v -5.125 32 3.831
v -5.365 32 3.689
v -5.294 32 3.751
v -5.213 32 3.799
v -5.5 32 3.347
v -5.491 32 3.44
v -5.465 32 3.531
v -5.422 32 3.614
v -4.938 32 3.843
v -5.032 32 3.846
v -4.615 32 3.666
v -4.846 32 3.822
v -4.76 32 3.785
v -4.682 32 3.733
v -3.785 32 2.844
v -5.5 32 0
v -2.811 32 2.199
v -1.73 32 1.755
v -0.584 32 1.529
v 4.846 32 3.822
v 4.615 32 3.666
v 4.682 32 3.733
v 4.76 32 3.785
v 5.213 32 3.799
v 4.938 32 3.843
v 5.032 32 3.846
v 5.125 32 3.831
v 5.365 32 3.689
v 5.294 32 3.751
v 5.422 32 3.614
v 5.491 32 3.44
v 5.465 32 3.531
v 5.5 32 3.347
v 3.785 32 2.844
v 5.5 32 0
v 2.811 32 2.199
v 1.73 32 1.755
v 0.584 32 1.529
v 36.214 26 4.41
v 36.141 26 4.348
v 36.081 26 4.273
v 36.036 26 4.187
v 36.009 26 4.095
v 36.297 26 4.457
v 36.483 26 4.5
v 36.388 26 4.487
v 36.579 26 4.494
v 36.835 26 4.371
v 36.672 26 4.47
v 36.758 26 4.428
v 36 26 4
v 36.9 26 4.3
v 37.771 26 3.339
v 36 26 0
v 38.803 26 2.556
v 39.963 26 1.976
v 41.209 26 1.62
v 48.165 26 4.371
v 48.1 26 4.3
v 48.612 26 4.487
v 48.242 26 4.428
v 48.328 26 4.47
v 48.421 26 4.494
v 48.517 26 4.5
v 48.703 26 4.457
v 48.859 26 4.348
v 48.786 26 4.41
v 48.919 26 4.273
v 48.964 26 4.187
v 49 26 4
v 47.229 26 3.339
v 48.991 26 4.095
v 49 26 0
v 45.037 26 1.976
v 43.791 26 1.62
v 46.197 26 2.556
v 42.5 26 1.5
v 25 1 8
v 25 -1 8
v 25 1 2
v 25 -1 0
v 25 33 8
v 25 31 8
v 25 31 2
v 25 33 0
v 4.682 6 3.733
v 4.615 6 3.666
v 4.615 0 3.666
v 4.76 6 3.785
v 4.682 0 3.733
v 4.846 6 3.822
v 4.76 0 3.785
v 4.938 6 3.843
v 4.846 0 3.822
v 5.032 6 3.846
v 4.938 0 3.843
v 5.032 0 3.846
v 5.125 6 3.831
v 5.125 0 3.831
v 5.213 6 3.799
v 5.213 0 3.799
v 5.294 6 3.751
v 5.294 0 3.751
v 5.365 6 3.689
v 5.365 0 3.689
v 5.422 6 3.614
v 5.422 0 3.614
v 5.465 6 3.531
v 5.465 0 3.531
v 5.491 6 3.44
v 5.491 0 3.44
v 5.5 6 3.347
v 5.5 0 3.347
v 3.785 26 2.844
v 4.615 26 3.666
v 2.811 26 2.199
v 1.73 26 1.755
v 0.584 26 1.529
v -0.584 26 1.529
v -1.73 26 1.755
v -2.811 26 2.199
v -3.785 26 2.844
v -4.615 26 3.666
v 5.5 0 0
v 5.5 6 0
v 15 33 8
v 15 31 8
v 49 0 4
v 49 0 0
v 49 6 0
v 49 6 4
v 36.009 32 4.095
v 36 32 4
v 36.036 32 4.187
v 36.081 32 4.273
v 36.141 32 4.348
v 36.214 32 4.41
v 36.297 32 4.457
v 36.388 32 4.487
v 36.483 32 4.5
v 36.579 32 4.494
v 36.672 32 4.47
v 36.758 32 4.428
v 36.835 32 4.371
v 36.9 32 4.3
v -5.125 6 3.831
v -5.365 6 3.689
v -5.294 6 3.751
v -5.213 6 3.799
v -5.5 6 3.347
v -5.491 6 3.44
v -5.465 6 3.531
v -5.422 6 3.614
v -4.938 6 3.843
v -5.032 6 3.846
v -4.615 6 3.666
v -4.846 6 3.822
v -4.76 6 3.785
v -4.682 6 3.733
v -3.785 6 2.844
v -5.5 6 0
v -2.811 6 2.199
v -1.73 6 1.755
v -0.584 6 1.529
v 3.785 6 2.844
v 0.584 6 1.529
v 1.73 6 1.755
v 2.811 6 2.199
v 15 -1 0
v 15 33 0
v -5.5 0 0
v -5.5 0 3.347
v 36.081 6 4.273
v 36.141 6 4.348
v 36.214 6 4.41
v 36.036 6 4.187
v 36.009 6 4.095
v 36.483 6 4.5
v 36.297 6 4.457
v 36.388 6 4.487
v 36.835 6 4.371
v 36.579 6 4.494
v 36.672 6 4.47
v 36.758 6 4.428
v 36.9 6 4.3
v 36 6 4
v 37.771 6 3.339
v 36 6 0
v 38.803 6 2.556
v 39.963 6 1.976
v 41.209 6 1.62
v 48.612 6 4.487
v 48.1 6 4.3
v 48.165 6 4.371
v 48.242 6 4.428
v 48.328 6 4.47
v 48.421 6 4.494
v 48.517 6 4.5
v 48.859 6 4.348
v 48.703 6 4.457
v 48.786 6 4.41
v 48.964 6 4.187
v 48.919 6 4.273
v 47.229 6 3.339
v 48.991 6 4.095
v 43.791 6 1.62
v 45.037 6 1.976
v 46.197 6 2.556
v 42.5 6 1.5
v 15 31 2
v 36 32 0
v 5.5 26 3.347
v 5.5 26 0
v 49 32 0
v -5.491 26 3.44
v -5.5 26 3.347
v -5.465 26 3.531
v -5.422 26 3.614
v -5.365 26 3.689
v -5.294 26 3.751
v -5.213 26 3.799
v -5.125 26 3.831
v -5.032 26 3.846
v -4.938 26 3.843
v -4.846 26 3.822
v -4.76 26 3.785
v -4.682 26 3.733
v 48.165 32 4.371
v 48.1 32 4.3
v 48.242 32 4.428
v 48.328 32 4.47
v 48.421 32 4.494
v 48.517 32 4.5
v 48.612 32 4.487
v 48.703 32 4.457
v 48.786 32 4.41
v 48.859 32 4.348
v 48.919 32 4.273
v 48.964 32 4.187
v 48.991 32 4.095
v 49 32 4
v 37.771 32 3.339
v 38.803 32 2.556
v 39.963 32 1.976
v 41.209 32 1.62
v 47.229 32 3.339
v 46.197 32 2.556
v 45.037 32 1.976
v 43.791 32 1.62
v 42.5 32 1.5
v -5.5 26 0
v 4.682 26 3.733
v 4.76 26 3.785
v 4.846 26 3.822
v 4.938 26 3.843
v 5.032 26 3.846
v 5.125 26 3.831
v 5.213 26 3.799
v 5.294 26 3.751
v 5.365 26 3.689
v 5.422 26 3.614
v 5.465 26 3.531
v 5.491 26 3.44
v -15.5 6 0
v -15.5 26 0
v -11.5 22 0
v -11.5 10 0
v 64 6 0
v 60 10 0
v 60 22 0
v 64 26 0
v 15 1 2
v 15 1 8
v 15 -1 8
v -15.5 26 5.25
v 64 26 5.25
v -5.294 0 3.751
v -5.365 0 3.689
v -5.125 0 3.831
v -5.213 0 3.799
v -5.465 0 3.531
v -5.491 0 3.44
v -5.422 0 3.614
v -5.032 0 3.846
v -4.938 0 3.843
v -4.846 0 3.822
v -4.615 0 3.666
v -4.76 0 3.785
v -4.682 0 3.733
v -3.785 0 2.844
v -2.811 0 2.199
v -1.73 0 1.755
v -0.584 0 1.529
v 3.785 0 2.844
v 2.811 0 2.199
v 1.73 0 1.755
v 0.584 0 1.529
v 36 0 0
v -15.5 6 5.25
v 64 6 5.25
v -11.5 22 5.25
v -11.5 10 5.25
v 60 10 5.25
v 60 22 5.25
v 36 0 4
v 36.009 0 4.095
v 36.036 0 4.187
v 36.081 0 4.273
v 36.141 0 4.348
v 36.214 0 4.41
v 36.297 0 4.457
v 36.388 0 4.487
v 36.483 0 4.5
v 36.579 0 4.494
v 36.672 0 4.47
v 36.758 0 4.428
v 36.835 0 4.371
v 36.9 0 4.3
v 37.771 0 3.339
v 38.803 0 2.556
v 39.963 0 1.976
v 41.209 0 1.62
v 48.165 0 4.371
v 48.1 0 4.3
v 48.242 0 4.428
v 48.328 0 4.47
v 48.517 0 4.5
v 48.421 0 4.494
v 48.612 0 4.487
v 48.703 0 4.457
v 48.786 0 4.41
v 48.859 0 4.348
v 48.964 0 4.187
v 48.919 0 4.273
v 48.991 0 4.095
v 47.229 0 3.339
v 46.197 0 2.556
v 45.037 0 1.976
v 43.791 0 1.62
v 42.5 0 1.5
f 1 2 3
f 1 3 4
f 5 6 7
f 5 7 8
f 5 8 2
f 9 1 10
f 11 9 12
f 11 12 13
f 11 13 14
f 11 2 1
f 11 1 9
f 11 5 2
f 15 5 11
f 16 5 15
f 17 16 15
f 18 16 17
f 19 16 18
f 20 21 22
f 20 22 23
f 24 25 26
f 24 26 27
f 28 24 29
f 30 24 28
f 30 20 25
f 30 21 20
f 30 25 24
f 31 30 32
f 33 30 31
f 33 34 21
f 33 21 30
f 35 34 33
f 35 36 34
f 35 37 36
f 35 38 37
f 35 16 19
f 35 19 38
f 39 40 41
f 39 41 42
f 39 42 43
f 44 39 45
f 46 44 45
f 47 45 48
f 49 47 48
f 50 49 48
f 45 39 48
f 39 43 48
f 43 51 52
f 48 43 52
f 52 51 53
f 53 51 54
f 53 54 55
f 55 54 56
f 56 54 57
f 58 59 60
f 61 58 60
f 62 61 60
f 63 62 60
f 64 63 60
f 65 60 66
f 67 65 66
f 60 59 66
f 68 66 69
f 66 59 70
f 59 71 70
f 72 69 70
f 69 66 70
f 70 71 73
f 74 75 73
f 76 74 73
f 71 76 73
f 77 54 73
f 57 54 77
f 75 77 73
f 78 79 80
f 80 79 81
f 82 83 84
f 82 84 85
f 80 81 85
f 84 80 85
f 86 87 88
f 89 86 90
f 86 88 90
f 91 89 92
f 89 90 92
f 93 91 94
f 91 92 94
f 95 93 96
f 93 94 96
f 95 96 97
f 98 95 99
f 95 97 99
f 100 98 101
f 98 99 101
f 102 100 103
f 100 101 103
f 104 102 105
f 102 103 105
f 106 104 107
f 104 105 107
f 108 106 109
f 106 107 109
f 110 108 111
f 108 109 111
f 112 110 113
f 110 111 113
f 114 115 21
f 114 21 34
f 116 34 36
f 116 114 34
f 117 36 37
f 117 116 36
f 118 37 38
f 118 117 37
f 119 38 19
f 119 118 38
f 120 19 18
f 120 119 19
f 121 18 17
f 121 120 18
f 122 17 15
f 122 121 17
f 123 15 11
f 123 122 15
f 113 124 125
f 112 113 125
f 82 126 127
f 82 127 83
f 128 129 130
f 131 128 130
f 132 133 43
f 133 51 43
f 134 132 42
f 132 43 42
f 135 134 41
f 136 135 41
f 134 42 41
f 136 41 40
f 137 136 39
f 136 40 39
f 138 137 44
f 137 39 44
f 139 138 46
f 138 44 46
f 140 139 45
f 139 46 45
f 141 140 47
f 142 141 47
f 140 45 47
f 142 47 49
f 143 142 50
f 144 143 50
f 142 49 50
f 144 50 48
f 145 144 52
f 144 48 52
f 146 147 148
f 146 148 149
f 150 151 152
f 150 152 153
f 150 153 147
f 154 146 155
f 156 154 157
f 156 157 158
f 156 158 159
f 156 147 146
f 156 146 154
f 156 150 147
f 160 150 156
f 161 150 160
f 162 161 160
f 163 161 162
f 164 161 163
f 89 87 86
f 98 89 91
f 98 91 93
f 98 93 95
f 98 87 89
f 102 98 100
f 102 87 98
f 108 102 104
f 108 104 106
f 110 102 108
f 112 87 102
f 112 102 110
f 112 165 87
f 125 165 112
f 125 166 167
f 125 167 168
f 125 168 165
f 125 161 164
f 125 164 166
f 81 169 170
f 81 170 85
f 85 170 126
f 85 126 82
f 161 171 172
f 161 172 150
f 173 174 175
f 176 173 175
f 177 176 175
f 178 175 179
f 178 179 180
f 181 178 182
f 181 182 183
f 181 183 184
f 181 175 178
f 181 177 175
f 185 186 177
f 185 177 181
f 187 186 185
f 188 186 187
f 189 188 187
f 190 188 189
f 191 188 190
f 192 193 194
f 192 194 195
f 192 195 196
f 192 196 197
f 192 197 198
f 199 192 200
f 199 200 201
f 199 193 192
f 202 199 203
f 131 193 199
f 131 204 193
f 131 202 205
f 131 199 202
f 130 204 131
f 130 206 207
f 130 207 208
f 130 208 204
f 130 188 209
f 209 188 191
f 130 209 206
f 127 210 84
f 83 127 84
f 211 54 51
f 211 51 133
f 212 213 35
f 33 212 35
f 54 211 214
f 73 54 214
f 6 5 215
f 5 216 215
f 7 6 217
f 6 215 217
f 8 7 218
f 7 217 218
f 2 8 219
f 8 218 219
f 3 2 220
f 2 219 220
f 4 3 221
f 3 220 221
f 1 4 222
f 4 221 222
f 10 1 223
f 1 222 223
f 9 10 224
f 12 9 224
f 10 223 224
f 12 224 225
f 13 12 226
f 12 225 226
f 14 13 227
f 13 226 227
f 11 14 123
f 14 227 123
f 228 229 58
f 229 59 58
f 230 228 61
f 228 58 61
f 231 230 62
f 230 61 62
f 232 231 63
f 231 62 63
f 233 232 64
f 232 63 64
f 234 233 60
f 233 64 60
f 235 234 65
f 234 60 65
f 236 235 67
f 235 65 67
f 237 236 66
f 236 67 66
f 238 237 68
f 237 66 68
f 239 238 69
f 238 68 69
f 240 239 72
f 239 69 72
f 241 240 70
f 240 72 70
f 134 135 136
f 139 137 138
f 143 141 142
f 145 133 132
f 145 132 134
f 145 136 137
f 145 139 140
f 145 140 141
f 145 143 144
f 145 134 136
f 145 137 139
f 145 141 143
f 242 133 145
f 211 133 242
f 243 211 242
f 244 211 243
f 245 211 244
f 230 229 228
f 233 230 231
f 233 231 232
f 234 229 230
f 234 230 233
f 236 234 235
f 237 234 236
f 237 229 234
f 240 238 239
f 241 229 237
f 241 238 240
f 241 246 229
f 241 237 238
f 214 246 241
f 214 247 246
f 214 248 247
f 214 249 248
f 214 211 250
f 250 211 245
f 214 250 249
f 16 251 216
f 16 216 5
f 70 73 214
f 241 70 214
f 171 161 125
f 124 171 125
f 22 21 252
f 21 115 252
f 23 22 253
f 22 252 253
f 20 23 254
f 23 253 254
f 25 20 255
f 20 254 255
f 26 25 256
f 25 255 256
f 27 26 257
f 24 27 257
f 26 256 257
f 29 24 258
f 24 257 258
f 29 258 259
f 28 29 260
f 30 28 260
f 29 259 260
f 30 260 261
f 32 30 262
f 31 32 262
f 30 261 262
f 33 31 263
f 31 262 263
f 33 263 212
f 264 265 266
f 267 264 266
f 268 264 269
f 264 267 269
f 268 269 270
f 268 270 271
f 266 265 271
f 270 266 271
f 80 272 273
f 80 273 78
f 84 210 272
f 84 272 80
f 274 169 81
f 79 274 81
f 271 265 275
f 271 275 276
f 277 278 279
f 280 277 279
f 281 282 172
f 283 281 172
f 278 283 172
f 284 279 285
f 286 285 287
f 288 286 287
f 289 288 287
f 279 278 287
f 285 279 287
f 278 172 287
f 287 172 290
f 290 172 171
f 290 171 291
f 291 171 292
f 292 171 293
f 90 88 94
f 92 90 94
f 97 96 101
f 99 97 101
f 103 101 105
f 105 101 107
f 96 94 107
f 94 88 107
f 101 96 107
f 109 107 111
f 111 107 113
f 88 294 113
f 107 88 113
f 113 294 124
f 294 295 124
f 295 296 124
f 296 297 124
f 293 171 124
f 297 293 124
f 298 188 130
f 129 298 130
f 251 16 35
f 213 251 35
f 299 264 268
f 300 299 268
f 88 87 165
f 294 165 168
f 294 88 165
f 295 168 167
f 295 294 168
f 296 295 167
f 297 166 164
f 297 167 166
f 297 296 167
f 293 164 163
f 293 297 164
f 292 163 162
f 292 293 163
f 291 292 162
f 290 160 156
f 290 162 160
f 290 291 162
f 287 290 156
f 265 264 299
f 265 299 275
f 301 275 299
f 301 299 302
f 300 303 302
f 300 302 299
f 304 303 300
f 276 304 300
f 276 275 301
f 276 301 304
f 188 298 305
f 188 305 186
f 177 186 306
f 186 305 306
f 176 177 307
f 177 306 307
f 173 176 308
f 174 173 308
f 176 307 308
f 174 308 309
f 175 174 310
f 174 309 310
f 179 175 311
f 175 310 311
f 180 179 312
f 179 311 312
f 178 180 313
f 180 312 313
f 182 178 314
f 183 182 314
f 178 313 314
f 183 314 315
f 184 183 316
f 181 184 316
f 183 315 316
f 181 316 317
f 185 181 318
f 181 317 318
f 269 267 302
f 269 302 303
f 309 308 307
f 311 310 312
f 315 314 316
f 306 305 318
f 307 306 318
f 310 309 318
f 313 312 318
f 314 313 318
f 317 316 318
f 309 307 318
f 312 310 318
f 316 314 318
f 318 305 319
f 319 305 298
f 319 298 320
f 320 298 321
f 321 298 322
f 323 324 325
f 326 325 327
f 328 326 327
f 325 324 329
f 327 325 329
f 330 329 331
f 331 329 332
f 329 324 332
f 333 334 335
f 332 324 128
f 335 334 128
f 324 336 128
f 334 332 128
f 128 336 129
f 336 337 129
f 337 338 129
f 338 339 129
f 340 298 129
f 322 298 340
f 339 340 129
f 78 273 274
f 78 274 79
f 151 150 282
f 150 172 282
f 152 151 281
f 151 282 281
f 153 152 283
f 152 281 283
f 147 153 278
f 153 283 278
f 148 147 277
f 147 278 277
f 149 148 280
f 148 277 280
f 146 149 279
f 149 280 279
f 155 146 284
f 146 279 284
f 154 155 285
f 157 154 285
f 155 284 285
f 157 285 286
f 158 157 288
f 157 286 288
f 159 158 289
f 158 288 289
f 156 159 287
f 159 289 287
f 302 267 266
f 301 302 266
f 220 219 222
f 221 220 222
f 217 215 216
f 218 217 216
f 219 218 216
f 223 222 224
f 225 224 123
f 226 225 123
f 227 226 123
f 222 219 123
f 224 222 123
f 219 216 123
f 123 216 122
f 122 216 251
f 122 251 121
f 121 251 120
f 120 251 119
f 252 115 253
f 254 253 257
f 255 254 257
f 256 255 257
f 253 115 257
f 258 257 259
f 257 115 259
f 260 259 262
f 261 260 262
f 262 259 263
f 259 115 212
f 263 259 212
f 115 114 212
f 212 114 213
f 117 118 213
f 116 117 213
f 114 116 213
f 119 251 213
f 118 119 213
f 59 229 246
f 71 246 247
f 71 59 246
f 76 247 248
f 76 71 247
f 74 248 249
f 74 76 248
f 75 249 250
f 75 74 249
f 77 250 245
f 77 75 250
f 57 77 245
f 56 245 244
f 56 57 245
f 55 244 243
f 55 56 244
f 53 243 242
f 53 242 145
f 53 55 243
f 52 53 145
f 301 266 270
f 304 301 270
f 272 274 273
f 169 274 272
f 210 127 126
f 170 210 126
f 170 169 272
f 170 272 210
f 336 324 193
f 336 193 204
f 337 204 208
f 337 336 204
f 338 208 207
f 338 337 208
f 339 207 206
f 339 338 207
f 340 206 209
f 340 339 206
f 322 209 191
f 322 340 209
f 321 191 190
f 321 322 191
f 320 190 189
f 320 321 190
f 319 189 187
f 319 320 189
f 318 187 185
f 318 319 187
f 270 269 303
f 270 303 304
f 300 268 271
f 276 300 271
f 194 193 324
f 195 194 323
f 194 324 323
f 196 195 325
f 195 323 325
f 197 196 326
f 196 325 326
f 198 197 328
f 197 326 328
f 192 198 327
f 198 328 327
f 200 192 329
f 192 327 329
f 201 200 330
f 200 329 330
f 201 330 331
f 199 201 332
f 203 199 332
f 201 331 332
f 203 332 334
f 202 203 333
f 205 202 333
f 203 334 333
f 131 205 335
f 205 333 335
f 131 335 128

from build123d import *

# Parameters (mm, degrees)
BOX017_W          = 71.5
BOX017_H          = 12
BOX017_DEPTH      = 5.75
BOX008_W          = 79.5
BOX008_H          = 20
BOX008_DEPTH      = 5.25
BOX016_W          = 54.5
BOX016_H          = 20
BOX016_DEPTH      = 10
CYLINDER001_R     = 7
CYLINDER001_DEPTH = 32
BOX015_W          = 13
BOX015_H          = 32
BOX015_DEPTH      = 8
CYLINDER_R        = 6
CYLINDER_DEPTH    = 32
BOX_W             = 11
BOX_H             = 32
BOX_DEPTH         = 8
FILLET_R          = 0.5
BOX019_W          = 10
BOX019_H          = 30
BOX019_DEPTH      = 8
BOX018_W          = 10
BOX018_H          = 34
BOX018_DEPTH      = 8


with BuildPart() as basecutout001:
    # Box017 → Box017 (new body)
    with BuildSketch(Plane(origin=(-11.5, 10, 0), x_dir=(1, 0, 0), z_dir=(0, 0, 1))):
        with Locations((35.75, 6)):
            Rectangle(BOX017_W, BOX017_H)
    extrude(amount=BOX017_DEPTH)


with BuildPart() as cut006:
    # Box008 → Box008 (new body)
    with BuildSketch(Plane(origin=(-15.5, 6, 0), x_dir=(1, 0, 0), z_dir=(0, 0, 1))):
        with Locations((39.75, 10)):
            Rectangle(BOX008_W, BOX008_H)
    extrude(amount=BOX008_DEPTH)

    # Cut006: cut basecutout001
    add(basecutout001.part, mode=Mode.SUBTRACT)


with BuildPart() as basecutout:
    # Box016 → Box016 (new body)
    with BuildSketch(Plane(origin=(-5.5, 6, 0), x_dir=(1, 0, 0), z_dir=(0, 0, 1))):
        with Locations((27.25, 10)):
            Rectangle(BOX016_W, BOX016_H)
    extrude(amount=BOX016_DEPTH)


with BuildPart() as cylinder001:
    # Cylinder001 → Cylinder001 (new body)
    with BuildSketch(Plane(origin=(42.5, 0, 8.5), x_dir=(1, 0, 0), z_dir=(0, 1, 0))):
        Circle(CYLINDER001_R)
    extrude(amount=CYLINDER001_DEPTH)


with BuildPart() as rearaxle:
    # Box015 → Box015 (new body)
    with BuildSketch(Plane(origin=(36, 0, 0), x_dir=(1, 0, 0), z_dir=(0, 0, 1))):
        with Locations((6.5, 16)):
            Rectangle(BOX015_W, BOX015_H)
    extrude(amount=BOX015_DEPTH)

    # Cut004: cut Cylinder001
    add(cylinder001.part, mode=Mode.SUBTRACT)


with BuildPart() as cylinder:
    # Cylinder → Cylinder (new body)
    with BuildSketch(Plane(origin=(0, 0, 7.5), x_dir=(1, 0, 0), z_dir=(0, 1, 0))):
        Circle(CYLINDER_R)
    extrude(amount=CYLINDER_DEPTH)


with BuildPart() as fillet_body:
    # Box → Box (new body)
    with BuildSketch(Plane(origin=(-5.5, 0, 0), x_dir=(1, 0, 0), z_dir=(0, 0, 1))):
        with Locations((5.5, 16)):
            Rectangle(BOX_W, BOX_H)
    extrude(amount=BOX_DEPTH)

    # Cut: cut Cylinder
    add(cylinder.part, mode=Mode.SUBTRACT)

    # Fusion: union RearAxle
    add(rearaxle.part)

    # Cut005: cut basecutout
    add(basecutout.part, mode=Mode.SUBTRACT)

    # Fillet
    fillet_edges = [fillet_body.edges().sort_by_distance(p)[0] for p in [
        (-5.5, 3, 5.102084),
        (5.5, 3, 5.102084),
        (-5.5, 29, 5.102084),
        (5.5, 29, 5.102084),
        (36, 3, 5.901924),
        (49, 3, 5.901924),
        (36, 29, 5.901924),
        (49, 29, 5.901924),
    ]]
    fillet(fillet_edges, radius=FILLET_R)


with BuildPart() as cube017:
    # Box019 → Box019 (new body)
    with BuildSketch(Plane(origin=(15, 1, 2), x_dir=(1, 0, 0), z_dir=(0, 0, 1))):
        with Locations((5, 15)):
            Rectangle(BOX019_W, BOX019_H)
    extrude(amount=BOX019_DEPTH)


with BuildPart() as cut007:
    # Box018 → Box018 (new body)
    with BuildSketch(Plane(origin=(15, -1, 0), x_dir=(1, 0, 0), z_dir=(0, 0, 1))):
        with Locations((5, 17)):
            Rectangle(BOX018_W, BOX018_H)
    extrude(amount=BOX018_DEPTH)

    # Cut007: cut Cube017
    add(cube017.part, mode=Mode.SUBTRACT)


solid = Compound([cut006.part, fillet_body.part, cut007.part])
